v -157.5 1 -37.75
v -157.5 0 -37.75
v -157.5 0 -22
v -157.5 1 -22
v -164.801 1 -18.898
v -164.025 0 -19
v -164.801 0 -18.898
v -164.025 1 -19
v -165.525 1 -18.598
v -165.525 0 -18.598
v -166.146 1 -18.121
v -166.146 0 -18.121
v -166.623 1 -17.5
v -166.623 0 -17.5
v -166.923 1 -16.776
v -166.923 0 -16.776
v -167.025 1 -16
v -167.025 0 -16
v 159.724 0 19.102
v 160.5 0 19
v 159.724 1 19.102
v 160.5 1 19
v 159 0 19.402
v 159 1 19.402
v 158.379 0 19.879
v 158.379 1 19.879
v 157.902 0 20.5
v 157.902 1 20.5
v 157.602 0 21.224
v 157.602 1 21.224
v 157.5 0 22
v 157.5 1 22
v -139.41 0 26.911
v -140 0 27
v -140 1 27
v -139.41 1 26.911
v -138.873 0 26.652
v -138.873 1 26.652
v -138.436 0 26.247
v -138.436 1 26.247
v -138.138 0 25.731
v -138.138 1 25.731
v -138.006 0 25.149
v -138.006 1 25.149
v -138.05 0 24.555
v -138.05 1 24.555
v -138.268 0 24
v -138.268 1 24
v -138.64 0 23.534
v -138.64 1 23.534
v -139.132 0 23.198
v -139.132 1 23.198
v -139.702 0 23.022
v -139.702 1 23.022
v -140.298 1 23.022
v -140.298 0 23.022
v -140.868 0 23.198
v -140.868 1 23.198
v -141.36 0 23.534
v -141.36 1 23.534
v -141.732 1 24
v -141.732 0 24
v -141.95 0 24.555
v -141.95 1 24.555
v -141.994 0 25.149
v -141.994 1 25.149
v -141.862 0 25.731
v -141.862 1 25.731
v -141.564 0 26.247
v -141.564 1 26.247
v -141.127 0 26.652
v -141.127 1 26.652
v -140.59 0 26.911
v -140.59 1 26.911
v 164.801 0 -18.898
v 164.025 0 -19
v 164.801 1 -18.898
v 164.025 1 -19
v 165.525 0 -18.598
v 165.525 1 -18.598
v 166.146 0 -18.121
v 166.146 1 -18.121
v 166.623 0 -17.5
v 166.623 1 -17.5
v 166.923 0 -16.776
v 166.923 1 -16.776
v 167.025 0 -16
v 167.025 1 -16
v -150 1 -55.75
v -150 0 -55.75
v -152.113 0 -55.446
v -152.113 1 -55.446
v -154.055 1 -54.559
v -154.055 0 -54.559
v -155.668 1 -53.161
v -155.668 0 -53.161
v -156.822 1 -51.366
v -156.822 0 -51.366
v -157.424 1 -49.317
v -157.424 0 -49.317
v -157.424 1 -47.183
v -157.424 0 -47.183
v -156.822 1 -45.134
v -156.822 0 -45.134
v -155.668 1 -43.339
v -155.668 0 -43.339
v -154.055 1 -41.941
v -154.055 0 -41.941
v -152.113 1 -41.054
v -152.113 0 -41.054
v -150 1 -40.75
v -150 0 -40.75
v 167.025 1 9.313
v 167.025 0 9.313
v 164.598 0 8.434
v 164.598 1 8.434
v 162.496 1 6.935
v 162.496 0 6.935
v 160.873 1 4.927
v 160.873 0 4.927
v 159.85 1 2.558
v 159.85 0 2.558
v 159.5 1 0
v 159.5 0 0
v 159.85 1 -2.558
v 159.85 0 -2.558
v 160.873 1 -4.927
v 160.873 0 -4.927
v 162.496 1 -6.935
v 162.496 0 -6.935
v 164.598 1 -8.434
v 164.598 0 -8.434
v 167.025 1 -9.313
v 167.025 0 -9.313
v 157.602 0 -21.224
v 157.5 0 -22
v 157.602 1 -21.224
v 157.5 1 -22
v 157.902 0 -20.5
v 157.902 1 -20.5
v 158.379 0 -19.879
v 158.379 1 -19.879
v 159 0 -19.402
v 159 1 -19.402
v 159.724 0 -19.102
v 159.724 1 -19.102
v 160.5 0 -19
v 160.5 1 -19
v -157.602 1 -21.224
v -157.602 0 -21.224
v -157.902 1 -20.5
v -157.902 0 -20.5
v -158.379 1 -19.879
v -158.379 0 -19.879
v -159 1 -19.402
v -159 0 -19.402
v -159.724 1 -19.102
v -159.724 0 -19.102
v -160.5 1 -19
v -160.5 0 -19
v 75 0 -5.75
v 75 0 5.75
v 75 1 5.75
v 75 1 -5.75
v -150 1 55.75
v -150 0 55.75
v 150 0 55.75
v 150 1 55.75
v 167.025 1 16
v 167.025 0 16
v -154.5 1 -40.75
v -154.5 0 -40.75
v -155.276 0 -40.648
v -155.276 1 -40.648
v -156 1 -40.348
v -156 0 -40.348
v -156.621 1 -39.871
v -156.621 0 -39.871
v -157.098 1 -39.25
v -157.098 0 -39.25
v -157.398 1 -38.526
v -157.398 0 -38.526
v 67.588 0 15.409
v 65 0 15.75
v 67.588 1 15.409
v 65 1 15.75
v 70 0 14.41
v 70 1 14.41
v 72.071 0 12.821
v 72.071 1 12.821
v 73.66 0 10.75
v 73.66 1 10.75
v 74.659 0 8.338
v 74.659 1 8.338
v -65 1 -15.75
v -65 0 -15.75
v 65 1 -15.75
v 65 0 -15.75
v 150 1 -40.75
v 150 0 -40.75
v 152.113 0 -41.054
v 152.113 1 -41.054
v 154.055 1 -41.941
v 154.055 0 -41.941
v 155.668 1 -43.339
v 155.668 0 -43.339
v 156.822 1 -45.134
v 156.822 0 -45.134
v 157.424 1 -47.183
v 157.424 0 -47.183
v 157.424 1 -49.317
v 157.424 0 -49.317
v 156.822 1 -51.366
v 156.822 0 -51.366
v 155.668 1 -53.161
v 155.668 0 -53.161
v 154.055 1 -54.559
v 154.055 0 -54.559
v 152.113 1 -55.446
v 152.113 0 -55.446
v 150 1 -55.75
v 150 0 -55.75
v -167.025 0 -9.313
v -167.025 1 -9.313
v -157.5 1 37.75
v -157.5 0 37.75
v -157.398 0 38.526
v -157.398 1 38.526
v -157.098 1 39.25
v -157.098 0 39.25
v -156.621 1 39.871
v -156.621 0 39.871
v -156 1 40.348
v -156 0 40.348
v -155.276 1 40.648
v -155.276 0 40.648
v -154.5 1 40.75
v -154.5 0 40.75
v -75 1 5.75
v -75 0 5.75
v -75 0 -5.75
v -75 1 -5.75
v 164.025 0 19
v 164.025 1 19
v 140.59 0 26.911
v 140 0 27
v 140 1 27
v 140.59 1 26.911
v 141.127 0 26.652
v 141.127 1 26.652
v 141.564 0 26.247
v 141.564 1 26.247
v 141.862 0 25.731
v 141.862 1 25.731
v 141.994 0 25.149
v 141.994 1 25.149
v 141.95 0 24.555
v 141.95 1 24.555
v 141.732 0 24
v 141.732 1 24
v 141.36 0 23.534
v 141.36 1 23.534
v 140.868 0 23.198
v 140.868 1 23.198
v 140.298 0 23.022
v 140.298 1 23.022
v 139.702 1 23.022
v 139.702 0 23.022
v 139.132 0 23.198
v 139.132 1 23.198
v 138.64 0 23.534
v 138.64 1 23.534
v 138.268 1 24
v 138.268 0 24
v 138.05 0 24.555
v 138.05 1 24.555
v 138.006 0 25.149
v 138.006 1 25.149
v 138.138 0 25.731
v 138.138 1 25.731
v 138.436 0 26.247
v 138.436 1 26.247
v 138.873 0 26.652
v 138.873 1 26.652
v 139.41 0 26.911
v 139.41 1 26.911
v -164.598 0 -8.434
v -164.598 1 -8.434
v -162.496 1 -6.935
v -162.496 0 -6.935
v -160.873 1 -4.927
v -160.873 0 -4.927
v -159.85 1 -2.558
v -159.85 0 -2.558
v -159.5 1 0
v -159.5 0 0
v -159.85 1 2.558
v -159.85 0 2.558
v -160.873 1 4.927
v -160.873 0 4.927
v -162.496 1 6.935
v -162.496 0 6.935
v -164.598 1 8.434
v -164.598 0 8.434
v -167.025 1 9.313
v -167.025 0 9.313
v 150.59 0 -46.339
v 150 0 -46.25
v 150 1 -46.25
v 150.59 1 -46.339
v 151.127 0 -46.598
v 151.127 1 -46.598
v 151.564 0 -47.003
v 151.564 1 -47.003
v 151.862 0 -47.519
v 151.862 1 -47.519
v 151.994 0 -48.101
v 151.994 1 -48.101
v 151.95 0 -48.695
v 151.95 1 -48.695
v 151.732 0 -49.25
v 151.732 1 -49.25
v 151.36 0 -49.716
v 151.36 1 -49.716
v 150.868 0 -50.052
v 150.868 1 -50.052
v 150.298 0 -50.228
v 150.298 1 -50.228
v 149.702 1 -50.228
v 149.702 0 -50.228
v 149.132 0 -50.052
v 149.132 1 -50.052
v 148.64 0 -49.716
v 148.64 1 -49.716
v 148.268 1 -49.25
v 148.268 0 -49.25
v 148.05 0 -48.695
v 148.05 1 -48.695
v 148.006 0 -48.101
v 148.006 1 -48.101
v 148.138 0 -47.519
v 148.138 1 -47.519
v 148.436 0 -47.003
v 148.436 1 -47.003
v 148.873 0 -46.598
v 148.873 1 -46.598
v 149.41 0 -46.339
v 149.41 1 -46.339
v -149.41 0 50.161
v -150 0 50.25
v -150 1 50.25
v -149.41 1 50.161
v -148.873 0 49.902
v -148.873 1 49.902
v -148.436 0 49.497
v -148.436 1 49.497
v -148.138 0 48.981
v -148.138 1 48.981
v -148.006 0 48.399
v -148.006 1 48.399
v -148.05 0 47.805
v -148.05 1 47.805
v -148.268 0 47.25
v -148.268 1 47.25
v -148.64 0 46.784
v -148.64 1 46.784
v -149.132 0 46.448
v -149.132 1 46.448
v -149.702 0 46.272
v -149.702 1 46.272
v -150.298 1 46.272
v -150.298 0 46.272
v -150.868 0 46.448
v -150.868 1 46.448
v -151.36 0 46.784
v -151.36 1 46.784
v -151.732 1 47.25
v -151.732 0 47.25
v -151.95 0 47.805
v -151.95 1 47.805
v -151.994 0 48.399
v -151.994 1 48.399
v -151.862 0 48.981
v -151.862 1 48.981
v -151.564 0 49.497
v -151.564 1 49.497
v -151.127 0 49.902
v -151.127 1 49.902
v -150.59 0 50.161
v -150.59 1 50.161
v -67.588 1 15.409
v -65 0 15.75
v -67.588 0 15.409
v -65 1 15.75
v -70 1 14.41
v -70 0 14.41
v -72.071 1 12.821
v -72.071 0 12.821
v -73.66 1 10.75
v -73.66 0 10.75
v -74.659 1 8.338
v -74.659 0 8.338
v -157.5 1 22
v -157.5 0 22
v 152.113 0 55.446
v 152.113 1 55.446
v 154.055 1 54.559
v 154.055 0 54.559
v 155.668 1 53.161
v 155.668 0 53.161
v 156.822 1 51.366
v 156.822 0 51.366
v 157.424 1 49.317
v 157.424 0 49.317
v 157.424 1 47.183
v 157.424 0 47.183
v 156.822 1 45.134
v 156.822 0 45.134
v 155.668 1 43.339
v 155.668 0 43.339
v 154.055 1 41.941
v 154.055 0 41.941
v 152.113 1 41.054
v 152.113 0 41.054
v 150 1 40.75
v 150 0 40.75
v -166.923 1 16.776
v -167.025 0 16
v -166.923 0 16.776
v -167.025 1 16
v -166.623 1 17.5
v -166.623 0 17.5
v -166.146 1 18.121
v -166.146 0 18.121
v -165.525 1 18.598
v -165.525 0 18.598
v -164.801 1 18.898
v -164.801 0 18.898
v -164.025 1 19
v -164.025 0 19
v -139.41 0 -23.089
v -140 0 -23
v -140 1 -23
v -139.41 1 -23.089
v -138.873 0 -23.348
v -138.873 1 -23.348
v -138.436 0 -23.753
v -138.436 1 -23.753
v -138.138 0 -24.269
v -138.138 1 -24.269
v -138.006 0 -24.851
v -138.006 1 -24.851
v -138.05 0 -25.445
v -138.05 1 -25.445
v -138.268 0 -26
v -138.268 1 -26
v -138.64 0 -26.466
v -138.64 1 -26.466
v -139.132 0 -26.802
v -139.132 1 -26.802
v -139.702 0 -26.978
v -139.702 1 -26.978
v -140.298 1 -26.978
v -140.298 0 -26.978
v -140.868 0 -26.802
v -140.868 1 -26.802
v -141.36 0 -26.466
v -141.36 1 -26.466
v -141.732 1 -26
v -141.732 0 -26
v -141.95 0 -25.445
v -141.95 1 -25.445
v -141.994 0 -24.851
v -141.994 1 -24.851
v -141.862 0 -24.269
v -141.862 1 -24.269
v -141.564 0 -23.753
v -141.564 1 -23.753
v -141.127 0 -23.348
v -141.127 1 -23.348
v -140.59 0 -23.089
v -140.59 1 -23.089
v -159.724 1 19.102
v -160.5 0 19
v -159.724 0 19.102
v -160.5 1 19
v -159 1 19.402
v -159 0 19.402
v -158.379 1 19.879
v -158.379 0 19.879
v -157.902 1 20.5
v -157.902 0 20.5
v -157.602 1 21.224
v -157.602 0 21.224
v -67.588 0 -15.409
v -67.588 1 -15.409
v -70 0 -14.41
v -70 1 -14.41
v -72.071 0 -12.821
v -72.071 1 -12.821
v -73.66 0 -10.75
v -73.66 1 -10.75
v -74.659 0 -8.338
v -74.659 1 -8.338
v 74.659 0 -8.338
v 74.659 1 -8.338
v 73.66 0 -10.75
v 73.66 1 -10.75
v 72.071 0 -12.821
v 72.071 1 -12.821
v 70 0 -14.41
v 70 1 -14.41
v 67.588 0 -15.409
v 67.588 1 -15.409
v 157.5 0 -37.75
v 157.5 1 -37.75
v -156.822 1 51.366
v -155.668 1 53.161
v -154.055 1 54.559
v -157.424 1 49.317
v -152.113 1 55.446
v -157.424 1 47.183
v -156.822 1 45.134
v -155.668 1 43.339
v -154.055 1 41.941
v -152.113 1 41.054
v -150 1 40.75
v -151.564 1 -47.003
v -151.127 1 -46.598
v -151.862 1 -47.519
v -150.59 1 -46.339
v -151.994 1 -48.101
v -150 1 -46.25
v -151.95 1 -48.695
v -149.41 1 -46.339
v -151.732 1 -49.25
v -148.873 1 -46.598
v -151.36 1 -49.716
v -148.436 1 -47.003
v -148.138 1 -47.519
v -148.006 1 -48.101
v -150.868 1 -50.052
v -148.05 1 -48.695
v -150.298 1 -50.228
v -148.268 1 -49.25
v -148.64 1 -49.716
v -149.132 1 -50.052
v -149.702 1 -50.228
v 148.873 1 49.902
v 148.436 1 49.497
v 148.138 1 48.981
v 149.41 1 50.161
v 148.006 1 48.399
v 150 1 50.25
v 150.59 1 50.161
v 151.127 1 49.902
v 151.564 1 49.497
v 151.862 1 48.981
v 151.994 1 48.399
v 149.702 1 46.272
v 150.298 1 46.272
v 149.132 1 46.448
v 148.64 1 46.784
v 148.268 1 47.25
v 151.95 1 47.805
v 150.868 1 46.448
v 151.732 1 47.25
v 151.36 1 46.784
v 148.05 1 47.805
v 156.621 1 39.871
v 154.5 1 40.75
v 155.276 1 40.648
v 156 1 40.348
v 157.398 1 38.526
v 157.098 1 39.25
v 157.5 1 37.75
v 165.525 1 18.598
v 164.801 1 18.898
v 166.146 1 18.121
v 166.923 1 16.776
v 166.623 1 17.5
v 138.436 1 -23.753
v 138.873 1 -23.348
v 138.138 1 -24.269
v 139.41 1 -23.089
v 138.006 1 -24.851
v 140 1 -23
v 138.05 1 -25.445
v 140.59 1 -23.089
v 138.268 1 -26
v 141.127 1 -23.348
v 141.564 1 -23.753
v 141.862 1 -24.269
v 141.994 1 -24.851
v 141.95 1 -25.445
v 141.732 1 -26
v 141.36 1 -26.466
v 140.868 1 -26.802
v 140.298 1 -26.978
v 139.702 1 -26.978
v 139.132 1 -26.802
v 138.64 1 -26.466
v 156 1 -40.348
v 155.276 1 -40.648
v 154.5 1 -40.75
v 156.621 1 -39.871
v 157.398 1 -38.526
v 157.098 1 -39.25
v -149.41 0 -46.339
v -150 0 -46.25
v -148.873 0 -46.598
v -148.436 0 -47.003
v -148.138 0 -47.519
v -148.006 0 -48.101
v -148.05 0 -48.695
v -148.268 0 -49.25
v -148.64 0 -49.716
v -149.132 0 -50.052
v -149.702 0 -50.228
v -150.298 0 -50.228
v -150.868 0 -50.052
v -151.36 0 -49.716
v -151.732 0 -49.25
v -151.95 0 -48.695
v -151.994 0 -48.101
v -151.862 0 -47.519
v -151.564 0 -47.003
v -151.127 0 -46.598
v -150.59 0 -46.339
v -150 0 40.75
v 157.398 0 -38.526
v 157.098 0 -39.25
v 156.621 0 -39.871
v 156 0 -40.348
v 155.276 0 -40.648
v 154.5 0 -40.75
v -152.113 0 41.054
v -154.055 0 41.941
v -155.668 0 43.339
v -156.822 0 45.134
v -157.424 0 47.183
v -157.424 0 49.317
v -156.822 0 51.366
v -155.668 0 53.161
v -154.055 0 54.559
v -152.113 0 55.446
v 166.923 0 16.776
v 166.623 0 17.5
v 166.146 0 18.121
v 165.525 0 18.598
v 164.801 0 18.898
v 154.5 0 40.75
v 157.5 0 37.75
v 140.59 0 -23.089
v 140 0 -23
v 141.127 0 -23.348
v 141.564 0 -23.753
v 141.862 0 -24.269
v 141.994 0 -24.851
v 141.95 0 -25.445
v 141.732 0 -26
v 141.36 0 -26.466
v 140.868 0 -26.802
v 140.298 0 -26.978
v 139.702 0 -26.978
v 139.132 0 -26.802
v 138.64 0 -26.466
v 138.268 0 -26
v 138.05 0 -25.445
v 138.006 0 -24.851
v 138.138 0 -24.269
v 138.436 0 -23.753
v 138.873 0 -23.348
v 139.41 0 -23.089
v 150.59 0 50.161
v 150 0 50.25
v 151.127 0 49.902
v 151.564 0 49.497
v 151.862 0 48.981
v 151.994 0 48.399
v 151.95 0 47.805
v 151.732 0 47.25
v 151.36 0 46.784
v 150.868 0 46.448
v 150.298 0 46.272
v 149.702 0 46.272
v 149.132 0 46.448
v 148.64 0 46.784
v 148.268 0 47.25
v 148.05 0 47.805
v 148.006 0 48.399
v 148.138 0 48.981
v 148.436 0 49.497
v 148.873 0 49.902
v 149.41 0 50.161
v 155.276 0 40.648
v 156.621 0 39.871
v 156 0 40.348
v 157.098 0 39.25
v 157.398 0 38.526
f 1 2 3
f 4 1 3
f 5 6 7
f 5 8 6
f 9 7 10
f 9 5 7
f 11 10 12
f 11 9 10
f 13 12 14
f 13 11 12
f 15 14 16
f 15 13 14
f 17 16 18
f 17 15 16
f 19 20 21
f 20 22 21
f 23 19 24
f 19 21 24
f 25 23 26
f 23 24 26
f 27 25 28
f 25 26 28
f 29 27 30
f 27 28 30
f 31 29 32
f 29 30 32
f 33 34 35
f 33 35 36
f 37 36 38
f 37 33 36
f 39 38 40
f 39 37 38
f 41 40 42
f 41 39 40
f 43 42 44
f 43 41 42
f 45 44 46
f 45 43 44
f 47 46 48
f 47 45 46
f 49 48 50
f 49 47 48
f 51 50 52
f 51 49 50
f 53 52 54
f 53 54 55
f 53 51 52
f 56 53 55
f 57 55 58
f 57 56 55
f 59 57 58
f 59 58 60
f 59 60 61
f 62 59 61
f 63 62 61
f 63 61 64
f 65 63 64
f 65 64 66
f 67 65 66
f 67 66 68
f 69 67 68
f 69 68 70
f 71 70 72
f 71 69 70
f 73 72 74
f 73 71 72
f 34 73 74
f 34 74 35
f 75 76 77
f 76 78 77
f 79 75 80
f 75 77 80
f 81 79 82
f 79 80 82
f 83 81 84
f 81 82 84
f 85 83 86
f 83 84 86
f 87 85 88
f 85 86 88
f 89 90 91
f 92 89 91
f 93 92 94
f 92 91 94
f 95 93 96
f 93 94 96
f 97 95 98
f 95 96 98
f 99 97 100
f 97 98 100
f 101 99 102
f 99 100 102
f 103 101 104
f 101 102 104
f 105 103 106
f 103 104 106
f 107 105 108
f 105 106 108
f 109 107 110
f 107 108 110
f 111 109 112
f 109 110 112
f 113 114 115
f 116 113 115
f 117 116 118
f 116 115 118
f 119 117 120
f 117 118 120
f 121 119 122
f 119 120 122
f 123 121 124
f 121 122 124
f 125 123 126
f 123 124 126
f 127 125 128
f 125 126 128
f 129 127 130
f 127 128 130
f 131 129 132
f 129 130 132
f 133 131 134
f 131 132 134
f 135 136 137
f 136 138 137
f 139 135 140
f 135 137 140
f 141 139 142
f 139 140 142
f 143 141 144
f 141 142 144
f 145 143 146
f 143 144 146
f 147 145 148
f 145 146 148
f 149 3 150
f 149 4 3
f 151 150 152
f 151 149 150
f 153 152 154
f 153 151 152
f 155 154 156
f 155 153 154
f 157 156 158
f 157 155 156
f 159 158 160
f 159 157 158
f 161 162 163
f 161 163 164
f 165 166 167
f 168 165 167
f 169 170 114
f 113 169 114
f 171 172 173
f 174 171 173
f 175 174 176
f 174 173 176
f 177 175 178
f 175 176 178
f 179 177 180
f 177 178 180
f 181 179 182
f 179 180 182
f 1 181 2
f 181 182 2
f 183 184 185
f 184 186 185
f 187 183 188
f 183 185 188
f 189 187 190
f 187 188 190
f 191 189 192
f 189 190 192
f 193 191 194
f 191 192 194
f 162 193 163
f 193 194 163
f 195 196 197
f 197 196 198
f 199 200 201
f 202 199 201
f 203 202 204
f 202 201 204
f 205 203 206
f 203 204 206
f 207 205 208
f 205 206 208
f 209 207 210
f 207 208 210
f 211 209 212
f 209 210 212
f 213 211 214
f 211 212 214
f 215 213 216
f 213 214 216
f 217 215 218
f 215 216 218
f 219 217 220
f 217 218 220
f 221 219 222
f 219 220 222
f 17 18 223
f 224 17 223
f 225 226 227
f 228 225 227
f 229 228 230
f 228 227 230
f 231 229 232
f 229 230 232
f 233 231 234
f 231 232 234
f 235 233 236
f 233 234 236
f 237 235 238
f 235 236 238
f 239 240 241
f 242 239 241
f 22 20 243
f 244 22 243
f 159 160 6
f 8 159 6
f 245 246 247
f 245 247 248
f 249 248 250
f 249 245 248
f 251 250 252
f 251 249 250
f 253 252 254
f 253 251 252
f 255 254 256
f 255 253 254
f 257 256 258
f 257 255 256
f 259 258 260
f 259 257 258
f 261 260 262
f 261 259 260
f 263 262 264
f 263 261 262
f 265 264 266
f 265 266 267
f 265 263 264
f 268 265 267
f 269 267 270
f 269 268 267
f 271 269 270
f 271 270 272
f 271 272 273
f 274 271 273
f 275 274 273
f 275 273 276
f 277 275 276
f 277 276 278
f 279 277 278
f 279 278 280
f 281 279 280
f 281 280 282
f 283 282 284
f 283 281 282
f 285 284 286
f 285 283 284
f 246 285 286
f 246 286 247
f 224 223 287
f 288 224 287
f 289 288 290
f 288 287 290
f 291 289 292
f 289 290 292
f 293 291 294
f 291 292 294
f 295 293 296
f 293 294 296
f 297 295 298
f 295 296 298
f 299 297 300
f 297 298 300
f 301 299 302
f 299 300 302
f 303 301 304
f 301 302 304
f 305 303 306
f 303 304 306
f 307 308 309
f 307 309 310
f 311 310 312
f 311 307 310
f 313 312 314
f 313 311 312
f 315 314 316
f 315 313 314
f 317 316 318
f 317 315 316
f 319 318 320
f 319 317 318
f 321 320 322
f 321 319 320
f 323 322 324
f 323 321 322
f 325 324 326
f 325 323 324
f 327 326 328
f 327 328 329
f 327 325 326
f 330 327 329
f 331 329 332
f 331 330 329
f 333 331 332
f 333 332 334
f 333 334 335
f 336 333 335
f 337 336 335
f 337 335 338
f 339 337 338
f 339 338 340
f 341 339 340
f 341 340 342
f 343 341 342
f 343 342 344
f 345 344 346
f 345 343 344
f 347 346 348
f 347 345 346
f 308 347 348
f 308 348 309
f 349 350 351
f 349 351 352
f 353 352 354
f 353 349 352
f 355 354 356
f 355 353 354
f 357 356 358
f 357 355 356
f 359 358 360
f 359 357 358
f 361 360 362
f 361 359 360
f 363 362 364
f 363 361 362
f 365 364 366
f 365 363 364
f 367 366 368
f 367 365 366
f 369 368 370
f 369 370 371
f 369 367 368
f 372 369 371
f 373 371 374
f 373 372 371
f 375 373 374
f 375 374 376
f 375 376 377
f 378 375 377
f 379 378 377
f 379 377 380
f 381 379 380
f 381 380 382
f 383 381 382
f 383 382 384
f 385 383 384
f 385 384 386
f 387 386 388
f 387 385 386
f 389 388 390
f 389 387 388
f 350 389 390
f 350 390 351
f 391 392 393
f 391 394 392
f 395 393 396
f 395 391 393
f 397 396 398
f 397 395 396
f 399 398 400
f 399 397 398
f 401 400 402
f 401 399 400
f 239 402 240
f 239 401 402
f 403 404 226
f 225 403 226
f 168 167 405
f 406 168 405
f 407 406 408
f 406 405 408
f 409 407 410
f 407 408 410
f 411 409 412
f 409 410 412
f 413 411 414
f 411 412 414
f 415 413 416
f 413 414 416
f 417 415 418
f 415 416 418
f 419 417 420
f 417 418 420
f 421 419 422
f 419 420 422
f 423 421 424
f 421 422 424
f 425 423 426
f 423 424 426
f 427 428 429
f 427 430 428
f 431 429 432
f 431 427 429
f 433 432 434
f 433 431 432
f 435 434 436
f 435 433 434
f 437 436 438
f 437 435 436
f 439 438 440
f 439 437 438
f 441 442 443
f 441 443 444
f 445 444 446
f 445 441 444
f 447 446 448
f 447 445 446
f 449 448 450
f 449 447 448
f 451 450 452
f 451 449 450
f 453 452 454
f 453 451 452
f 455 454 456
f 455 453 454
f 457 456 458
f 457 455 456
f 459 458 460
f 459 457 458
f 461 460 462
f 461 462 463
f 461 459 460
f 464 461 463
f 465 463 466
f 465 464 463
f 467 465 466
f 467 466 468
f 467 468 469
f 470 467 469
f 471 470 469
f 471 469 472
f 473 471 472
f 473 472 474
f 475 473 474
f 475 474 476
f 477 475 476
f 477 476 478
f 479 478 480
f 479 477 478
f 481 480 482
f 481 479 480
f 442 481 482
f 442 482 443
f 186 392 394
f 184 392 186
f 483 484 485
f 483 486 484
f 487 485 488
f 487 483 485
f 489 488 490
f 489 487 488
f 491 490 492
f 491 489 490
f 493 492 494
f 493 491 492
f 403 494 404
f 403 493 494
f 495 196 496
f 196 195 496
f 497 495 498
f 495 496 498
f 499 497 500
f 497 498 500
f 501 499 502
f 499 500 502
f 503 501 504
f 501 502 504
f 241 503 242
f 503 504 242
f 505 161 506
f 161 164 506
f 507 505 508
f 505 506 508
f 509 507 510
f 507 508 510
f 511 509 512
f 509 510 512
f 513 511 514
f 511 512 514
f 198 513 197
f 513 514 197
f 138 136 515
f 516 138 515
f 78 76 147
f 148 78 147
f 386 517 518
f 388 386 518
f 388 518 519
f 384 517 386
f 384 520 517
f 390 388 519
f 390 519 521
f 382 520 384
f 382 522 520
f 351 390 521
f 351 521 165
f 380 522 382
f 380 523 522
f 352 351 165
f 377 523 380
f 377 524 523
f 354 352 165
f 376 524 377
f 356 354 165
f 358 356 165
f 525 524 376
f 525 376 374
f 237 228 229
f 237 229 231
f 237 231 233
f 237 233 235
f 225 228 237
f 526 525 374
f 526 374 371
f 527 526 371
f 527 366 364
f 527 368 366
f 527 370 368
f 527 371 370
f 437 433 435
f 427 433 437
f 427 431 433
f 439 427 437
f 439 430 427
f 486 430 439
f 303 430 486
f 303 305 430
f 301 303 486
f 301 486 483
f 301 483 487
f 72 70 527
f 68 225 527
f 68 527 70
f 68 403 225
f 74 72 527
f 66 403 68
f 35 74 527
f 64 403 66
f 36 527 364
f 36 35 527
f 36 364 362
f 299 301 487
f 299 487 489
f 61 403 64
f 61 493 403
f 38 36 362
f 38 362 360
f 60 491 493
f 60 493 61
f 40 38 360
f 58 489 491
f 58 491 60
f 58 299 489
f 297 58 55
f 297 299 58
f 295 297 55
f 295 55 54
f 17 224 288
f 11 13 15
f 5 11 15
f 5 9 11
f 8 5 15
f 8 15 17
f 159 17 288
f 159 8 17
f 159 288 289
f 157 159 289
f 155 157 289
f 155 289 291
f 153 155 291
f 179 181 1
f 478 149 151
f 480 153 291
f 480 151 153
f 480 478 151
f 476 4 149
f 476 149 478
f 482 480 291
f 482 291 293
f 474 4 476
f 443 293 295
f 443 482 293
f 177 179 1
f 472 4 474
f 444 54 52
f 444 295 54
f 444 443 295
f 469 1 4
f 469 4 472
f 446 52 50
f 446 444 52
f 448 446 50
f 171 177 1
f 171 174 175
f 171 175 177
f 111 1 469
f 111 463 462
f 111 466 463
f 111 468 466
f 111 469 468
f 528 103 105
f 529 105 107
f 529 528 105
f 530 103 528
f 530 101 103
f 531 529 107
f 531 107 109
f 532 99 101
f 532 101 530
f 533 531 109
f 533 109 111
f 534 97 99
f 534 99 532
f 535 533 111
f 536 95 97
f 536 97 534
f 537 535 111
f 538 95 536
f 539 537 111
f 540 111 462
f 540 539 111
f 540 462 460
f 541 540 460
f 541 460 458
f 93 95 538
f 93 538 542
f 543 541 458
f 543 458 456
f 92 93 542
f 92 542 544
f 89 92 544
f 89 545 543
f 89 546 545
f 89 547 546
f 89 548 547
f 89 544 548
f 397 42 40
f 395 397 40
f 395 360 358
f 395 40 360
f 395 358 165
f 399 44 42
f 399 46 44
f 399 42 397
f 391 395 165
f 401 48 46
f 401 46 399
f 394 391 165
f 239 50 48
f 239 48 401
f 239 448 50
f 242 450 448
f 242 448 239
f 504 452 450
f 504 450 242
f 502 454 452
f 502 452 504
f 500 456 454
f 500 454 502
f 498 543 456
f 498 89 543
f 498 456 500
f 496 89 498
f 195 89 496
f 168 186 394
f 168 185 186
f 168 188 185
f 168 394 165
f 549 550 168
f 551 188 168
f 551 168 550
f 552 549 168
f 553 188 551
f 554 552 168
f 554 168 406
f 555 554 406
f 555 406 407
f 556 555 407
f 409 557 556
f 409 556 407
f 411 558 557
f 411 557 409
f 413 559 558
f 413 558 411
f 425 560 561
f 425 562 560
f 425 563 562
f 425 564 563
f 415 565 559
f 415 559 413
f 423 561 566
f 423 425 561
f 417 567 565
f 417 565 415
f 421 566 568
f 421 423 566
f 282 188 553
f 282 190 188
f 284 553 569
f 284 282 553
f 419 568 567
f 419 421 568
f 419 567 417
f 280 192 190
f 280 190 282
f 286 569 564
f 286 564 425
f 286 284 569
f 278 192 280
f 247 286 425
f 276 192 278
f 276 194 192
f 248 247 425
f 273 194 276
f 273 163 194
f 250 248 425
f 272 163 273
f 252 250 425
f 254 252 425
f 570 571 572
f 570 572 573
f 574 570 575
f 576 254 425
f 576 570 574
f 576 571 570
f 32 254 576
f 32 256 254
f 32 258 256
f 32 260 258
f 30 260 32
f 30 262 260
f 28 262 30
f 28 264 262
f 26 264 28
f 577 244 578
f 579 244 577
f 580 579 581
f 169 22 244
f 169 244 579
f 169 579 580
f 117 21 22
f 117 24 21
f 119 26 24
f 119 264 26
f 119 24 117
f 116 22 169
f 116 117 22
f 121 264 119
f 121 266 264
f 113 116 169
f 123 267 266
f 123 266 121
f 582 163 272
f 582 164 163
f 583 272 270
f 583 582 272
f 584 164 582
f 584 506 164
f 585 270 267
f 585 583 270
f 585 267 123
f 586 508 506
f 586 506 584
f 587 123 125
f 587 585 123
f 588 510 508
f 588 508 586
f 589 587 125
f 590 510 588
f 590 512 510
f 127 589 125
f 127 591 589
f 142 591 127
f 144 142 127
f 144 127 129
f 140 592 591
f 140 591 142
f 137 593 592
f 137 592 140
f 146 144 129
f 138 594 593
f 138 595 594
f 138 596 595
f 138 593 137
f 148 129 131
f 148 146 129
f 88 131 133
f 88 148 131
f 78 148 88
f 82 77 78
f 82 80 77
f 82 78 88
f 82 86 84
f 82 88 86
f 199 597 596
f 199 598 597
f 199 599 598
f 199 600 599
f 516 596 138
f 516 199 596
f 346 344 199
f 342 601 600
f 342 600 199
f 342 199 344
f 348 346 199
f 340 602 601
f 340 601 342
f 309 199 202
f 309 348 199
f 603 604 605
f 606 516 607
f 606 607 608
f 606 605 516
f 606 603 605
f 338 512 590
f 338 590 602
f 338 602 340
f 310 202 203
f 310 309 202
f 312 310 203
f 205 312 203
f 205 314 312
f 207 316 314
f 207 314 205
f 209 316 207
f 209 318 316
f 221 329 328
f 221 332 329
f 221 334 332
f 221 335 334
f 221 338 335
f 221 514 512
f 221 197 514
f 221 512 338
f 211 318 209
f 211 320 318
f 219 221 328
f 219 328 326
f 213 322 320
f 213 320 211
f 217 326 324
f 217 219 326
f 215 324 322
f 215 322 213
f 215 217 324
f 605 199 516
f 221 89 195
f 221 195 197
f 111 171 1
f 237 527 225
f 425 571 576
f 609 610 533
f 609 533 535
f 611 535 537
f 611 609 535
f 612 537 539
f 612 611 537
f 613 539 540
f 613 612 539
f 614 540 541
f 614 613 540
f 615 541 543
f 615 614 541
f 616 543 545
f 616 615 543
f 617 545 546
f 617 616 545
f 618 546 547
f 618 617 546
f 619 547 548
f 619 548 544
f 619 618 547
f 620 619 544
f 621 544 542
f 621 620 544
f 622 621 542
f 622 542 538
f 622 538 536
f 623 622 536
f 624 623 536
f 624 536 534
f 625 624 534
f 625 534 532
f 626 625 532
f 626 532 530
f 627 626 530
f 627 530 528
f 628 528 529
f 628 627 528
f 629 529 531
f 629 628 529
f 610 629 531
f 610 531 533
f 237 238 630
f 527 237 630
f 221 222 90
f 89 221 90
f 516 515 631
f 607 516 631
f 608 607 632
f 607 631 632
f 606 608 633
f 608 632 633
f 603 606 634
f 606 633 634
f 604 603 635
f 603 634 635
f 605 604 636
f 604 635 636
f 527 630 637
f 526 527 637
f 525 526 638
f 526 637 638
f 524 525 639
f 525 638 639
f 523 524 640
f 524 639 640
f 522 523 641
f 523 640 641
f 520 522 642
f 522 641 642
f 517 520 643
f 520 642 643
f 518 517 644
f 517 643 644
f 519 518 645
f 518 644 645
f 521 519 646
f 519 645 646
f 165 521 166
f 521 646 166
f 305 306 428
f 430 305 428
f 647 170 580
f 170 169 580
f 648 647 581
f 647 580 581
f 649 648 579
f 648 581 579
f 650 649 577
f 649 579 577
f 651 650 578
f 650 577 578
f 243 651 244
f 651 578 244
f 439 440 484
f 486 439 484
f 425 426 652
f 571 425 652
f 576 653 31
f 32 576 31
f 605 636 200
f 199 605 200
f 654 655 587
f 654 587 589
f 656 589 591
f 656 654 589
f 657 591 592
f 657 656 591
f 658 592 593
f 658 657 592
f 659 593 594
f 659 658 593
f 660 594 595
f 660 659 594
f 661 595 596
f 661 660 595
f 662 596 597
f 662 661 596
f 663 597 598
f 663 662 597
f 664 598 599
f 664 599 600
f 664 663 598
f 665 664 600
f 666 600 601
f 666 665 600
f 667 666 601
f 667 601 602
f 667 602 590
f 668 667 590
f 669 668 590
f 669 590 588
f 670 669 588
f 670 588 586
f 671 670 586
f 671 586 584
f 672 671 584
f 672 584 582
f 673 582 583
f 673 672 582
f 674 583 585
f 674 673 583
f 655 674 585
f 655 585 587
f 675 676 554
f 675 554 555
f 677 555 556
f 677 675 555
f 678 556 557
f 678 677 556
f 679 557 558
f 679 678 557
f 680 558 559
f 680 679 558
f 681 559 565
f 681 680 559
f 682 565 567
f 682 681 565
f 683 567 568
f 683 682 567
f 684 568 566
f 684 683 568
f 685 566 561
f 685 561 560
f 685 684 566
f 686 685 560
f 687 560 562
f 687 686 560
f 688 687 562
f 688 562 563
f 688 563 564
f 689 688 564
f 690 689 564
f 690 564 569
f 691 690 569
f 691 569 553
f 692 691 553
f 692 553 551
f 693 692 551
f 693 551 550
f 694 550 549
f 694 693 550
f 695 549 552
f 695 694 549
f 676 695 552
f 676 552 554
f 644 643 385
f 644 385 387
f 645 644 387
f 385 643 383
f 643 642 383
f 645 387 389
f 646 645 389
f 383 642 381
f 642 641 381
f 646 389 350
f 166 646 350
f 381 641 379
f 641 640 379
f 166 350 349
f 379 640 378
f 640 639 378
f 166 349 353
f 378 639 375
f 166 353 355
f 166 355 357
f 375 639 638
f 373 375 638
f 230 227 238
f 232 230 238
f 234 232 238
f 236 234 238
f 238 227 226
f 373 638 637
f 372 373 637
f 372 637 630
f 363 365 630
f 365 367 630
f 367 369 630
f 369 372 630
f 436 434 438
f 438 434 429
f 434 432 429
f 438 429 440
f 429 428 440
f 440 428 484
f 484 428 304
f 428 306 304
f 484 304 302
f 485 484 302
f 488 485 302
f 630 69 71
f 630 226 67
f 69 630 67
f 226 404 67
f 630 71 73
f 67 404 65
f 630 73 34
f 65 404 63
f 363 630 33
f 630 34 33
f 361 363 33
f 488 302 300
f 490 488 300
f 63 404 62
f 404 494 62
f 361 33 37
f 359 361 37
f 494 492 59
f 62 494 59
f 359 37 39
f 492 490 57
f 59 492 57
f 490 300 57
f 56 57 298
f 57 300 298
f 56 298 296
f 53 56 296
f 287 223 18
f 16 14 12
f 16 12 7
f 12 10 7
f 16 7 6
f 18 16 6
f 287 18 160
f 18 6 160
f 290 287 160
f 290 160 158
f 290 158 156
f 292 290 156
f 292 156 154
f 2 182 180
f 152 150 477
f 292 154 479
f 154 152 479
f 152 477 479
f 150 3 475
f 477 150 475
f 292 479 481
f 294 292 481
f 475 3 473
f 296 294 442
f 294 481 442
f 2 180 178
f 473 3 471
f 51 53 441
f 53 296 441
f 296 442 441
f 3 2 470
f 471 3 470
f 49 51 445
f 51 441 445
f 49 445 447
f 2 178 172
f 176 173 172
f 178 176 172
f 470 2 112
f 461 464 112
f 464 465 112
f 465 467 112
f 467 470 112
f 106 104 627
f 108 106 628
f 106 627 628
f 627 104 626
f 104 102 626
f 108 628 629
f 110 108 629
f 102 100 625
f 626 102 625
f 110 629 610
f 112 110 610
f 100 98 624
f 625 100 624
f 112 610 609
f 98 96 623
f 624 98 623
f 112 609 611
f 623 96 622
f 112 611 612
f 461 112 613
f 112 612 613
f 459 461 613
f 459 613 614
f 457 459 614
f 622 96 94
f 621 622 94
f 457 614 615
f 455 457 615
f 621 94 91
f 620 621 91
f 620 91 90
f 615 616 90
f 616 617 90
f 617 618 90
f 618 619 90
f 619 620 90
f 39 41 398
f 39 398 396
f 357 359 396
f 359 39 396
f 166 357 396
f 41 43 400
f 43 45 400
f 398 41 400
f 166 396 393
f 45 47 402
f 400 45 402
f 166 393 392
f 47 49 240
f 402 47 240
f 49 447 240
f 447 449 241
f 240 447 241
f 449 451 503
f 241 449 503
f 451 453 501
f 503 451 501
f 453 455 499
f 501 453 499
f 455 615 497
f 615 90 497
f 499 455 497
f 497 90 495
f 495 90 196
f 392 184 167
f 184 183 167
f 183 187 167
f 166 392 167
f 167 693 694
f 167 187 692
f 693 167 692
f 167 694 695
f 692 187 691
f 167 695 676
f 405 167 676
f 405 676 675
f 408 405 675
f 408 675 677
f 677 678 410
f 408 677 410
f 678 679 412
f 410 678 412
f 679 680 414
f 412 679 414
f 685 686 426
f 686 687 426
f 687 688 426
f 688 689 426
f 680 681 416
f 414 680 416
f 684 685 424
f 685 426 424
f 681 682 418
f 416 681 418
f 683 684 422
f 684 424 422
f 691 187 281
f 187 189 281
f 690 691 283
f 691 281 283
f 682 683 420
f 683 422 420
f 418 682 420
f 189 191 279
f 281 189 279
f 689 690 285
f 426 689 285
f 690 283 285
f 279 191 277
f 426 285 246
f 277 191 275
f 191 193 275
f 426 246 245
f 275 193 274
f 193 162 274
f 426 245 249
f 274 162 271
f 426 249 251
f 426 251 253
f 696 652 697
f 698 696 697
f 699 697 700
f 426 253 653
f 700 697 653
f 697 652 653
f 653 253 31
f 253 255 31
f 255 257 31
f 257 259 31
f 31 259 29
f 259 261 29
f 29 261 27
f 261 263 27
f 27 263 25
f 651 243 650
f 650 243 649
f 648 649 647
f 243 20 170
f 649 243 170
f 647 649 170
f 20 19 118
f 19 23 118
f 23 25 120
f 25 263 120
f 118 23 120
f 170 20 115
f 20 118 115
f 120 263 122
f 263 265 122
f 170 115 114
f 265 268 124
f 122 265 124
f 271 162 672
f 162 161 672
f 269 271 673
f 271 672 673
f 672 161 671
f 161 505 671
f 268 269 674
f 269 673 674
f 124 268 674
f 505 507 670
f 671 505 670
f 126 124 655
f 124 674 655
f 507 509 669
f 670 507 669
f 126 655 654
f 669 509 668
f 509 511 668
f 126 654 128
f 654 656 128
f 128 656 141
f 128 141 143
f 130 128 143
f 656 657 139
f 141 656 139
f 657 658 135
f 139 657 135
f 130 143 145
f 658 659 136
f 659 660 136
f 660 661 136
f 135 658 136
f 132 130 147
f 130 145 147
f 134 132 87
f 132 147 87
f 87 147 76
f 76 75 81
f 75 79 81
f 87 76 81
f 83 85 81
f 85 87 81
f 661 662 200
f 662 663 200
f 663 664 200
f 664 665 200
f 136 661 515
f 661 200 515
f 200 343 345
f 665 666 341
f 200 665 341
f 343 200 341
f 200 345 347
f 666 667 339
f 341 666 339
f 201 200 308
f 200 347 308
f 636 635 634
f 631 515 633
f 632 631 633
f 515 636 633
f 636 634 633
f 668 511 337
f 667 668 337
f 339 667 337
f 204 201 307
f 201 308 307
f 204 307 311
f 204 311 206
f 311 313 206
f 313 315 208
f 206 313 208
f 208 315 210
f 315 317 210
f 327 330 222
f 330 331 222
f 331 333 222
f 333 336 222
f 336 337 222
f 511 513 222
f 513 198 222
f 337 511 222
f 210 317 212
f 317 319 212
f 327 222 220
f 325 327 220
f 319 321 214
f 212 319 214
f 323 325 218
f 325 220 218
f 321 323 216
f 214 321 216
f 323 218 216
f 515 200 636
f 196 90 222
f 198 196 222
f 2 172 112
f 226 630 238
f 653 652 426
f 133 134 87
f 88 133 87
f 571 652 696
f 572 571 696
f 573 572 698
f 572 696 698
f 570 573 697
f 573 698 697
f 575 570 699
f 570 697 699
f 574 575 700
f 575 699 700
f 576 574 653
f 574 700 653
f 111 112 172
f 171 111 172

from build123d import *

# Parameters (mm, degrees)
SKETCH1_R           = 2
SKETCH1_W           = 150
SKETCH1_H           = 31.5
BOSS_EXTRUDE1_DEPTH = 1
FILLET1_R           = 10
FILLET2_R           = 3


with BuildPart() as part:
    # Sketch1 → Boss-Extrude1 (new body)
    with BuildSketch(Plane(origin=(0, 0, 0), x_dir=(1, 0, 0), z_dir=(0, 1, 0))):
        with BuildLine():
            Line((150, 55.75), (-150, 55.75))
            ThreePointArc((-150, 55.75), (-157.5, 48.25), (-150, 40.75))
            Line((-150, 40.75), (-154.5, 40.75))
            ThreePointArc((-154.5, 40.75), (-156.621320344, 39.871320344), (-157.5, 37.75))
            Line((-157.5, 37.75), (-157.5, 19))
            Line((-157.5, 19), (-167.025, 19))
            Line((-167.025, 19), (-167.025, 9.312659395))
            ThreePointArc((-167.025, 9.312659395), (-159.5, 0), (-167.025, -9.312659395))
            Line((-167.025, -9.312659395), (-167.025, -19))
            Line((-167.025, -19), (-157.5, -19))
            Line((-157.5, -19), (-157.5, -37.75))
            ThreePointArc((-157.5, -37.75), (-156.621320344, -39.871320344), (-154.5, -40.75))
            Line((-154.5, -40.75), (-150, -40.75))
            ThreePointArc((-150, -40.75), (-157.5, -48.25), (-150, -55.75))
            Line((-150, -55.75), (150, -55.75))
            ThreePointArc((150, -55.75), (157.5, -48.25), (150, -40.75))
            Line((150, -40.75), (154.5, -40.75))
            ThreePointArc((154.5, -40.75), (156.621320344, -39.871320344), (157.5, -37.75))
            Line((157.5, -37.75), (157.5, -19))
            Line((157.5, -19), (167.025, -19))
            Line((167.025, -19), (167.025, -9.312659395))
            ThreePointArc((167.025, -9.312659395), (159.5, 0), (167.025, 9.312659395))
            Line((167.025, 9.312659395), (167.025, 19))
            Line((167.025, 19), (157.5, 19))
            Line((157.5, 19), (157.5, 37.75))
            ThreePointArc((157.5, 37.75), (156.621320344, 39.871320344), (154.5, 40.75))
            Line((154.5, 40.75), (150, 40.75))
            ThreePointArc((150, 40.75), (157.5, 48.25), (150, 55.75))
        make_face()
        with Locations(Location((-150, 48.25, 0), (0, 0, 270))):
            Circle(SKETCH1_R, mode=Mode.SUBTRACT)
        with Locations(Location((150, 48.25, 0), (0, 0, 270))):
            Circle(SKETCH1_R, mode=Mode.SUBTRACT)
        with Locations(Location((150, -48.25, 0), (0, 0, 270))):
            Circle(SKETCH1_R, mode=Mode.SUBTRACT)
        with Locations(Location((-150, -48.25, 0), (0, 0, 270))):
            Circle(SKETCH1_R, mode=Mode.SUBTRACT)
        with Locations(Location((-140, 25, 0), (0, 0, 270))):
            Circle(SKETCH1_R, mode=Mode.SUBTRACT)
        with Locations(Location((-140, -25, 0), (0, 0, 270))):
            Circle(SKETCH1_R, mode=Mode.SUBTRACT)
        with Locations(Location((140, -25, 0), (0, 0, 270))):
            Circle(SKETCH1_R, mode=Mode.SUBTRACT)
        with Locations(Location((140, 25, 0), (0, 0, 270))):
            Circle(SKETCH1_R, mode=Mode.SUBTRACT)
        Rectangle(SKETCH1_W, SKETCH1_H, mode=Mode.SUBTRACT)
    extrude(amount=BOSS_EXTRUDE1_DEPTH)

    # Fillet1
    fillet1_edges = [part.edges().sort_by_distance(p)[0] for p in [
        (-75, 0.5, -15.75),
        (-75, 0.5, 15.75),
        (75, 0.5, 15.75),
        (75, 0.5, -15.75),
    ]]
    fillet(fillet1_edges, radius=FILLET1_R)

    # Fillet2
    fillet2_edges = [part.edges().sort_by_distance(p)[0] for p in [
        (-157.5, 0.5, 19),
        (-167.025, 0.5, 19),
        (-167.025, 0.5, -19),
        (-157.5, 0.5, -19),
        (157.5, 0.5, -19),
        (167.025, 0.5, -19),
        (167.025, 0.5, 19),
        (157.5, 0.5, 19),
    ]]
    fillet(fillet2_edges, radius=FILLET2_R)


solid = part.part
